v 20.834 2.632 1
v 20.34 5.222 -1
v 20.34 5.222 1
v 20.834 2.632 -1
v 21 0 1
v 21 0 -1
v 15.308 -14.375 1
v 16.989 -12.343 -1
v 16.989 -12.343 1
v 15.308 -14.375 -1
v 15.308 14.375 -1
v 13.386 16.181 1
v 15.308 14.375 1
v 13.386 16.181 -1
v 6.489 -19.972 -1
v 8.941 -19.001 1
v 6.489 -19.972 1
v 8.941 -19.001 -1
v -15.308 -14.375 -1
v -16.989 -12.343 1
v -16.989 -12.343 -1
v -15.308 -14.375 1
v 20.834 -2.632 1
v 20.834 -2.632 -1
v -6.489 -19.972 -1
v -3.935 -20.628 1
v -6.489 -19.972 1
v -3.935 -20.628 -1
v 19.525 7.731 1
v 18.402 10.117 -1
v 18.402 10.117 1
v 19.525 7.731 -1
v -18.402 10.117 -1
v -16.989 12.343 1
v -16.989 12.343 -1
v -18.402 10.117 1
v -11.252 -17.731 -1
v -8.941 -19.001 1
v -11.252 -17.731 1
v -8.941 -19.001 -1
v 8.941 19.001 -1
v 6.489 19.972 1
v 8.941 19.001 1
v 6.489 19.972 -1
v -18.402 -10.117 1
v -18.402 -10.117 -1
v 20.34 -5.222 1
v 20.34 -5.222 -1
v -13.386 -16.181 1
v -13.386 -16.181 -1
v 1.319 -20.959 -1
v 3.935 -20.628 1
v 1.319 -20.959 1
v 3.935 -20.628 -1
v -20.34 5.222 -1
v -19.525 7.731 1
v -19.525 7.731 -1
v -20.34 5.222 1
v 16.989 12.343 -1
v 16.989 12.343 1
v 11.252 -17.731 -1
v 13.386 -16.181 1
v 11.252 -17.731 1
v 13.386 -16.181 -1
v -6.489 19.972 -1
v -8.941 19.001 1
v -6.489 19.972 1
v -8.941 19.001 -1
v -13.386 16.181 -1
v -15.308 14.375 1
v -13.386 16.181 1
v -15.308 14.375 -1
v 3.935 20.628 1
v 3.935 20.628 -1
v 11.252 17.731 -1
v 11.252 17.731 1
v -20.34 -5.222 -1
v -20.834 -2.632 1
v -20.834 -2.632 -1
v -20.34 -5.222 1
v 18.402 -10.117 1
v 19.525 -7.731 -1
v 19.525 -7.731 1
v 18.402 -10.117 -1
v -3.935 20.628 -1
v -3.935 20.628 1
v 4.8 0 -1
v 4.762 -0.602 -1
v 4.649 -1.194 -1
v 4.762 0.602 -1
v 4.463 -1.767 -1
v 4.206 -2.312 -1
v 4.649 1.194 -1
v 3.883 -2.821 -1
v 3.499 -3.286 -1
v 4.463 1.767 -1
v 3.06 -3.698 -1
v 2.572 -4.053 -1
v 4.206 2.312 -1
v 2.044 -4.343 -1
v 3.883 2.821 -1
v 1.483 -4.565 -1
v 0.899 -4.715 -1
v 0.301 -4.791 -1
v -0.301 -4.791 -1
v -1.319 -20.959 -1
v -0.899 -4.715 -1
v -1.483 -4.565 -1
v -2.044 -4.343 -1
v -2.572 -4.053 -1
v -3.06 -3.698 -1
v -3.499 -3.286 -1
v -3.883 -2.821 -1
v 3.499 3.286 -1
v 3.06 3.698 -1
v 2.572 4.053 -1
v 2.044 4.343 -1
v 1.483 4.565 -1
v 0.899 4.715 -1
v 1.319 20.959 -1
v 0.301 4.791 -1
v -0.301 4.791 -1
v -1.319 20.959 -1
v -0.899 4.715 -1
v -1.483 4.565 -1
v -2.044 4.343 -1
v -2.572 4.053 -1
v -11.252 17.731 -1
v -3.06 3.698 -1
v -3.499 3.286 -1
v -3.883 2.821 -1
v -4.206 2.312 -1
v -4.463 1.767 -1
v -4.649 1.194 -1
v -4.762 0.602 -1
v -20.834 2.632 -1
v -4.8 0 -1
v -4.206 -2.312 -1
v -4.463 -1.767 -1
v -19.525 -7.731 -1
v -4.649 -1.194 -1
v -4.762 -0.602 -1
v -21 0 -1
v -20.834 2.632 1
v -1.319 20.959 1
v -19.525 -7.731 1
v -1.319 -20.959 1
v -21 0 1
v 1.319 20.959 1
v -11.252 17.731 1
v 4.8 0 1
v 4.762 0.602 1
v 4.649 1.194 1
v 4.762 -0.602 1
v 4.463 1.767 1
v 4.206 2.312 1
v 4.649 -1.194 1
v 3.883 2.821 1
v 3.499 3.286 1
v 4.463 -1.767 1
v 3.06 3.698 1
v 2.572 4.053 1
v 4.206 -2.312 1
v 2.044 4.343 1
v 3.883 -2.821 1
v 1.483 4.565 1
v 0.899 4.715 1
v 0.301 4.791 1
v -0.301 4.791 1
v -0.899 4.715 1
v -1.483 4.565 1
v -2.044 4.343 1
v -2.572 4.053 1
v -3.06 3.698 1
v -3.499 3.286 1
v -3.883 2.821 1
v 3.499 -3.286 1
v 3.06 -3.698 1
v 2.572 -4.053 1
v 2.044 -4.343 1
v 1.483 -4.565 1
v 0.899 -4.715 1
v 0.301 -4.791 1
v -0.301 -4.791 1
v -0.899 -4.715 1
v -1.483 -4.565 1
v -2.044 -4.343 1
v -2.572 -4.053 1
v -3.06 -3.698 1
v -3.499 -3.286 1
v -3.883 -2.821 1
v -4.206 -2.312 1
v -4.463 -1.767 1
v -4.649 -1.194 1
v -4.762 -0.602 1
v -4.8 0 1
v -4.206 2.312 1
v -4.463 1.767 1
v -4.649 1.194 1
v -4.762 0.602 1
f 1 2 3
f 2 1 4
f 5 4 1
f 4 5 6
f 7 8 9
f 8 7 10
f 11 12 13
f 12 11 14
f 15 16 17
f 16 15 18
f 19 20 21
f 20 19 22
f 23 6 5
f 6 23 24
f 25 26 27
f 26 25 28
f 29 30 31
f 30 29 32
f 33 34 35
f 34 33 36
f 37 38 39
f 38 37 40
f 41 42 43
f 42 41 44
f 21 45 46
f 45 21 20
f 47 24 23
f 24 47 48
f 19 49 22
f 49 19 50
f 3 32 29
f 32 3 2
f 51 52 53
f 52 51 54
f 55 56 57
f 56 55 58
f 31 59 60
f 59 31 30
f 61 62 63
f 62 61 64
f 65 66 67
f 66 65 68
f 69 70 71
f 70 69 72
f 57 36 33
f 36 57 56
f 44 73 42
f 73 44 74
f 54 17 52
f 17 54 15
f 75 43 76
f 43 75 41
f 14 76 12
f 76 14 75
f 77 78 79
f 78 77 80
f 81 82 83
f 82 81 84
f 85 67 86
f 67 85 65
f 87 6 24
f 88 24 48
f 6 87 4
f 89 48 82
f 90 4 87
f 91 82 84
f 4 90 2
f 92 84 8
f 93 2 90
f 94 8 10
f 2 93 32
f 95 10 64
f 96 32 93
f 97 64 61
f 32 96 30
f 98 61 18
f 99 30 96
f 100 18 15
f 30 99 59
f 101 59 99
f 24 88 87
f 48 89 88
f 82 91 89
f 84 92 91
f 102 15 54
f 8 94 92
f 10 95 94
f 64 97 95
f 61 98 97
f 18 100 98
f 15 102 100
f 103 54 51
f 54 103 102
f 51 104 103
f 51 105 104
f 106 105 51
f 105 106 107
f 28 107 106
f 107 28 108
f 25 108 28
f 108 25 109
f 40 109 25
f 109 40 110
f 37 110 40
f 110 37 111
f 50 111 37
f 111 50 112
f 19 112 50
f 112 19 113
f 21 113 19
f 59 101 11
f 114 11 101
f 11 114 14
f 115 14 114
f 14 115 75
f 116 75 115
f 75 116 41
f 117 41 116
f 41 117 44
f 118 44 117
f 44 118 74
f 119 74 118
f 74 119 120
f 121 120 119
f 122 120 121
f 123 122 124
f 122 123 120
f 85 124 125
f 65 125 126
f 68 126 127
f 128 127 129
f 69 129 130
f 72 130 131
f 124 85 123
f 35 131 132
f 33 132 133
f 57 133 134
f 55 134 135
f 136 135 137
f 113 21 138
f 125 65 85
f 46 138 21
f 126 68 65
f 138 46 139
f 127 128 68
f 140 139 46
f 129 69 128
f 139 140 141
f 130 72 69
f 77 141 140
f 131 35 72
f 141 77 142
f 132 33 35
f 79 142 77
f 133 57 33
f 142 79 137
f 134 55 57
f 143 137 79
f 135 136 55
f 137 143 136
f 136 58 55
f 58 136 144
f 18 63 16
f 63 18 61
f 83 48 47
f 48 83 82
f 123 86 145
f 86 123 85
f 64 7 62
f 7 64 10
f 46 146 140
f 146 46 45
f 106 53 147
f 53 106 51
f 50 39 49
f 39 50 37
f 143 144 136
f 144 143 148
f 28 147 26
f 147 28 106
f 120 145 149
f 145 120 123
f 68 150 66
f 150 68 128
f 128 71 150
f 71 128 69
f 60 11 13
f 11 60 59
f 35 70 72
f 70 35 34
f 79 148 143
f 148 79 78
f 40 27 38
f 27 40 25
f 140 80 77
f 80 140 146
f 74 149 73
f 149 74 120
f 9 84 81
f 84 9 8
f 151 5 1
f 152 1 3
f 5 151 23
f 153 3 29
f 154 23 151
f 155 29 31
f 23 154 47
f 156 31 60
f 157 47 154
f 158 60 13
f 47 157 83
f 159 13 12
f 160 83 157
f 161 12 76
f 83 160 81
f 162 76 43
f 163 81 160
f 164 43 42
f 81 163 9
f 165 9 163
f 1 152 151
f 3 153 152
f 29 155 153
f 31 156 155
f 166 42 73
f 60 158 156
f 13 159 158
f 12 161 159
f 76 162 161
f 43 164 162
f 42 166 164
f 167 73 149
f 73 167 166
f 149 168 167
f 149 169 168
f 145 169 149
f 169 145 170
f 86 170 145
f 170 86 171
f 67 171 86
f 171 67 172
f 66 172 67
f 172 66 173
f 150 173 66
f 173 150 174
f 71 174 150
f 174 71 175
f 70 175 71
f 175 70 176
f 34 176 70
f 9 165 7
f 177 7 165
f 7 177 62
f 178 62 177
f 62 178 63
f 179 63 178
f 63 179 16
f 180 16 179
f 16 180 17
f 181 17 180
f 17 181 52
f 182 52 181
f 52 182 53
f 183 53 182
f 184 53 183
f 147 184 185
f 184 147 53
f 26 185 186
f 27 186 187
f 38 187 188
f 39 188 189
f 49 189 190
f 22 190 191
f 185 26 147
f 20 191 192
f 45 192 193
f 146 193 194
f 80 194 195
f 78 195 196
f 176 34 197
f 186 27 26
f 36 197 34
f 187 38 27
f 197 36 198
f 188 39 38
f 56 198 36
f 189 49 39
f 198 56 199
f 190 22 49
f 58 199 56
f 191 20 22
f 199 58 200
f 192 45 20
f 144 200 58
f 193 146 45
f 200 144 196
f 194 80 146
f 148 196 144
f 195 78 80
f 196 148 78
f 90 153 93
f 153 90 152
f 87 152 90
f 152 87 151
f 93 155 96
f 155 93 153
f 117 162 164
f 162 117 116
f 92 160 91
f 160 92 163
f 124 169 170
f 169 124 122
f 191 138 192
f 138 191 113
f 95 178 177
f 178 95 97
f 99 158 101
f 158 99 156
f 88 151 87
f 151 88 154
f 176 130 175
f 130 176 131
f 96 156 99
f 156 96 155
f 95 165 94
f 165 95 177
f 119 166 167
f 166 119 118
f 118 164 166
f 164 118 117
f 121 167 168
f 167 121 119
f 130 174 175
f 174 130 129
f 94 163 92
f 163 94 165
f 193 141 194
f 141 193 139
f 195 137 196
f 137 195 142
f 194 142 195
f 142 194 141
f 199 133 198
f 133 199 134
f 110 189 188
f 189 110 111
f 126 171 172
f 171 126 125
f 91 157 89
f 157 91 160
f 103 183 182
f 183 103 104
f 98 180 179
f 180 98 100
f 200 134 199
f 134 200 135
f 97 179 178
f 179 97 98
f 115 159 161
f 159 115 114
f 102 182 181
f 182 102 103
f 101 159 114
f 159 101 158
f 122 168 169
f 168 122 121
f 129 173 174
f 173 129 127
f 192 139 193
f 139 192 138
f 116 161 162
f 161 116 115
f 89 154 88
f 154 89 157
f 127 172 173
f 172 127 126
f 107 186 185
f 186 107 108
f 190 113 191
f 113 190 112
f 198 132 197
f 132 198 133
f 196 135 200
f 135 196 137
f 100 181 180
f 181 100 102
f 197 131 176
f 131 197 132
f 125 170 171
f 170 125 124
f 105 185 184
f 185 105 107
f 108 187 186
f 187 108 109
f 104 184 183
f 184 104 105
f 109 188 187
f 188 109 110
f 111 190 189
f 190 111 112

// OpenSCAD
// file: roundedcube.scad
// More information: https://danielupshaw.com/openscad-rounded-corners/

// Set to 0.01 for higher definition curves (renders slower)
$fs = 0.15;

module roundedcube(size = [1, 1, 1], center = false, radius = 0.5, apply_to = "all") {
	// If single value, convert to [x, y, z] vector
	size = (size[0] == undef) ? [size, size, size] : size;

	translate_min = radius;
	translate_xmax = size[0] - radius;
	translate_ymax = size[1] - radius;
	translate_zmax = size[2] - radius;

	diameter = radius * 2;

	obj_translate = (center == false) ?
		[0, 0, 0] : [
			-(size[0] / 2),
			-(size[1] / 2),
			-(size[2] / 2)
		];

	translate(v = obj_translate) {
		hull() {
			for (translate_x = [translate_min, translate_xmax]) {
				x_at = (translate_x == translate_min) ? "min" : "max";
				for (translate_y = [translate_min, translate_ymax]) {
					y_at = (translate_y == translate_min) ? "min" : "max";
					for (translate_z = [translate_min, translate_zmax]) {
						z_at = (translate_z == translate_min) ? "min" : "max";

						translate(v = [translate_x, translate_y, translate_z])
						if (
							(apply_to == "all") ||
							(apply_to == "xmin" && x_at == "min") || (apply_to == "xmax" && x_at == "max") ||
							(apply_to == "ymin" && y_at == "min") || (apply_to == "ymax" && y_at == "max") ||
							(apply_to == "zmin" && z_at == "min") || (apply_to == "zmax" && z_at == "max")
						) {
							sphere(r = radius);
						} else {
							rotate = 
								(apply_to == "xmin" || apply_to == "xmax" || apply_to == "x") ? [0, 90, 0] : (
								(apply_to == "ymin" || apply_to == "ymax" || apply_to == "y") ? [90, 90, 0] :
								[0, 0, 0]
							);
							rotate(a = rotate)
							cylinder(h = diameter, r = radius, center = true);
						}
					}
				}
			}
		}
	}
}
// file: parameters.scad
/* Copyright Brian Stephan 2023
 *
 * This file is part of the Buildable Stick System.
 *
 * The Buildable Stick System is free software: you can redistribute it and/or modify
 * it under the terms of the GNU General Public License as published by the
 * Free Software Foundation, either version 3 of the License, or (at your
 * option) any later version.
 *
 * The Buildable Stick System is distributed in the hope that it will be useful, but
 * WITHOUT ANY WARRANTY; without even the implied warranty of MERCHANTABILITY
 * or FITNESS FOR A PARTICULAR PURPOSE. See the GNU General Public License for
 * more details.
 *
 * You should have received a copy of the GNU General Public License along with
 * the Buildable Stick System. If not, see <https://www.gnu.org/licenses/>.
 */

// adjustments
hole_tolerance = 0.15;

// M2
m2_screw_selftap_radius = 0.95;

// M3
m3_screw_selftap_radius = 1.3;

// M4
m4_bolt_radius = 2 + hole_tolerance;
m4_bolt_countersink_radius = 6.1 + hole_tolerance;
m4_bolt_hex_exterior_radius = 3.6 + hole_tolerance;

// 24mm button
small_button_radius = 12 + hole_tolerance;

// 30mm button
big_button_radius = 15 + hole_tolerance;

// JLF mount dimensions
lever_mount_x = 53;
lever_mount_y = 95;
lever_mount_z = 2;

// standard lever hole
lever_plate_hole = 12;

// case dimensions
// base frame box. reminder: top of inside (including mounts) is chopped by top_plate_z for plates
frame_x = 233;
frame_y = 208;
frame_z = 55;

frame_center_to_neutrik = 70;

// depth of the "lip" of the frame that the top plate sets into/supports the overhang
frame_wall = 4;

// per neutrik (mm)
neutrik_panel_thickness = 3;

// top plate, which can either be the whole plate ("inset") or the mounting frame for a plate that overhangs
top_plate_x = frame_x - (frame_wall * 2);
top_plate_y = frame_y - (frame_wall * 2);
top_plate_z = 5;

// how much the top plate x/y is expanded to overhang the frame
// note that this is relative to the top plate (so the wall is added back)
top_plate_overhang_amount = 8.5;
overhang_top_plate_x = top_plate_x + (frame_wall * 2) + (top_plate_overhang_amount * 2);
overhang_top_plate_y = top_plate_y + (frame_wall * 2) + (top_plate_overhang_amount * 2);

plate_to_frame_point_x = (top_plate_x/2)-10;
plate_to_frame_point_y = (top_plate_y/2)-10;

// frame interior that supports the top plates
panel_support_width = 5;

// neutrik D screw holes
neutrik_d_screw_radius = 1.6 + hole_tolerance;
neutrik_d_radius = 12 + hole_tolerance;

// additional button radius for decorative panels, etc.
decorative_radius_scale = 1.75;
jumbo_decorative_radius_scale = 2;
// main file
/* Copyright Brian Stephan 2023
 * SPDX-License-Identifier: GPL-3.0-or-later
 *
 * This file is part of the Buildable Stick System.
 *
 * The Buildable Stick System is free software: you can redistribute it and/or modify
 * it under the terms of the GNU General Public License as published by the
 * Free Software Foundation, either version 3 of the License, or (at your
 * option) any later version.
 *
 * The Buildable Stick System is distributed in the hope that it will be useful, but
 * WITHOUT ANY WARRANTY; without even the implied warranty of MERCHANTABILITY
 * or FITNESS FOR A PARTICULAR PURPOSE. See the GNU General Public License for
 * more details.
 *
 * You should have received a copy of the GNU General Public License along with
 * the Buildable Stick System. If not, see <https://www.gnu.org/licenses/>.
 */

include <parameters.scad>
include <components.scad>

module jlf_dustwasher() {
	difference() {
		cylinder(r=lever_plate_hole*decorative_radius_scale, h=2, $fn=50, center=true);
		// 5.25 = 4.55 (diameter of shaft is 9.10mm) + .25 to let it take an angle
		cylinder(r=4.8, h=2.1, $fn=50, center=true);
	}
}

jlf_dustwasher();
